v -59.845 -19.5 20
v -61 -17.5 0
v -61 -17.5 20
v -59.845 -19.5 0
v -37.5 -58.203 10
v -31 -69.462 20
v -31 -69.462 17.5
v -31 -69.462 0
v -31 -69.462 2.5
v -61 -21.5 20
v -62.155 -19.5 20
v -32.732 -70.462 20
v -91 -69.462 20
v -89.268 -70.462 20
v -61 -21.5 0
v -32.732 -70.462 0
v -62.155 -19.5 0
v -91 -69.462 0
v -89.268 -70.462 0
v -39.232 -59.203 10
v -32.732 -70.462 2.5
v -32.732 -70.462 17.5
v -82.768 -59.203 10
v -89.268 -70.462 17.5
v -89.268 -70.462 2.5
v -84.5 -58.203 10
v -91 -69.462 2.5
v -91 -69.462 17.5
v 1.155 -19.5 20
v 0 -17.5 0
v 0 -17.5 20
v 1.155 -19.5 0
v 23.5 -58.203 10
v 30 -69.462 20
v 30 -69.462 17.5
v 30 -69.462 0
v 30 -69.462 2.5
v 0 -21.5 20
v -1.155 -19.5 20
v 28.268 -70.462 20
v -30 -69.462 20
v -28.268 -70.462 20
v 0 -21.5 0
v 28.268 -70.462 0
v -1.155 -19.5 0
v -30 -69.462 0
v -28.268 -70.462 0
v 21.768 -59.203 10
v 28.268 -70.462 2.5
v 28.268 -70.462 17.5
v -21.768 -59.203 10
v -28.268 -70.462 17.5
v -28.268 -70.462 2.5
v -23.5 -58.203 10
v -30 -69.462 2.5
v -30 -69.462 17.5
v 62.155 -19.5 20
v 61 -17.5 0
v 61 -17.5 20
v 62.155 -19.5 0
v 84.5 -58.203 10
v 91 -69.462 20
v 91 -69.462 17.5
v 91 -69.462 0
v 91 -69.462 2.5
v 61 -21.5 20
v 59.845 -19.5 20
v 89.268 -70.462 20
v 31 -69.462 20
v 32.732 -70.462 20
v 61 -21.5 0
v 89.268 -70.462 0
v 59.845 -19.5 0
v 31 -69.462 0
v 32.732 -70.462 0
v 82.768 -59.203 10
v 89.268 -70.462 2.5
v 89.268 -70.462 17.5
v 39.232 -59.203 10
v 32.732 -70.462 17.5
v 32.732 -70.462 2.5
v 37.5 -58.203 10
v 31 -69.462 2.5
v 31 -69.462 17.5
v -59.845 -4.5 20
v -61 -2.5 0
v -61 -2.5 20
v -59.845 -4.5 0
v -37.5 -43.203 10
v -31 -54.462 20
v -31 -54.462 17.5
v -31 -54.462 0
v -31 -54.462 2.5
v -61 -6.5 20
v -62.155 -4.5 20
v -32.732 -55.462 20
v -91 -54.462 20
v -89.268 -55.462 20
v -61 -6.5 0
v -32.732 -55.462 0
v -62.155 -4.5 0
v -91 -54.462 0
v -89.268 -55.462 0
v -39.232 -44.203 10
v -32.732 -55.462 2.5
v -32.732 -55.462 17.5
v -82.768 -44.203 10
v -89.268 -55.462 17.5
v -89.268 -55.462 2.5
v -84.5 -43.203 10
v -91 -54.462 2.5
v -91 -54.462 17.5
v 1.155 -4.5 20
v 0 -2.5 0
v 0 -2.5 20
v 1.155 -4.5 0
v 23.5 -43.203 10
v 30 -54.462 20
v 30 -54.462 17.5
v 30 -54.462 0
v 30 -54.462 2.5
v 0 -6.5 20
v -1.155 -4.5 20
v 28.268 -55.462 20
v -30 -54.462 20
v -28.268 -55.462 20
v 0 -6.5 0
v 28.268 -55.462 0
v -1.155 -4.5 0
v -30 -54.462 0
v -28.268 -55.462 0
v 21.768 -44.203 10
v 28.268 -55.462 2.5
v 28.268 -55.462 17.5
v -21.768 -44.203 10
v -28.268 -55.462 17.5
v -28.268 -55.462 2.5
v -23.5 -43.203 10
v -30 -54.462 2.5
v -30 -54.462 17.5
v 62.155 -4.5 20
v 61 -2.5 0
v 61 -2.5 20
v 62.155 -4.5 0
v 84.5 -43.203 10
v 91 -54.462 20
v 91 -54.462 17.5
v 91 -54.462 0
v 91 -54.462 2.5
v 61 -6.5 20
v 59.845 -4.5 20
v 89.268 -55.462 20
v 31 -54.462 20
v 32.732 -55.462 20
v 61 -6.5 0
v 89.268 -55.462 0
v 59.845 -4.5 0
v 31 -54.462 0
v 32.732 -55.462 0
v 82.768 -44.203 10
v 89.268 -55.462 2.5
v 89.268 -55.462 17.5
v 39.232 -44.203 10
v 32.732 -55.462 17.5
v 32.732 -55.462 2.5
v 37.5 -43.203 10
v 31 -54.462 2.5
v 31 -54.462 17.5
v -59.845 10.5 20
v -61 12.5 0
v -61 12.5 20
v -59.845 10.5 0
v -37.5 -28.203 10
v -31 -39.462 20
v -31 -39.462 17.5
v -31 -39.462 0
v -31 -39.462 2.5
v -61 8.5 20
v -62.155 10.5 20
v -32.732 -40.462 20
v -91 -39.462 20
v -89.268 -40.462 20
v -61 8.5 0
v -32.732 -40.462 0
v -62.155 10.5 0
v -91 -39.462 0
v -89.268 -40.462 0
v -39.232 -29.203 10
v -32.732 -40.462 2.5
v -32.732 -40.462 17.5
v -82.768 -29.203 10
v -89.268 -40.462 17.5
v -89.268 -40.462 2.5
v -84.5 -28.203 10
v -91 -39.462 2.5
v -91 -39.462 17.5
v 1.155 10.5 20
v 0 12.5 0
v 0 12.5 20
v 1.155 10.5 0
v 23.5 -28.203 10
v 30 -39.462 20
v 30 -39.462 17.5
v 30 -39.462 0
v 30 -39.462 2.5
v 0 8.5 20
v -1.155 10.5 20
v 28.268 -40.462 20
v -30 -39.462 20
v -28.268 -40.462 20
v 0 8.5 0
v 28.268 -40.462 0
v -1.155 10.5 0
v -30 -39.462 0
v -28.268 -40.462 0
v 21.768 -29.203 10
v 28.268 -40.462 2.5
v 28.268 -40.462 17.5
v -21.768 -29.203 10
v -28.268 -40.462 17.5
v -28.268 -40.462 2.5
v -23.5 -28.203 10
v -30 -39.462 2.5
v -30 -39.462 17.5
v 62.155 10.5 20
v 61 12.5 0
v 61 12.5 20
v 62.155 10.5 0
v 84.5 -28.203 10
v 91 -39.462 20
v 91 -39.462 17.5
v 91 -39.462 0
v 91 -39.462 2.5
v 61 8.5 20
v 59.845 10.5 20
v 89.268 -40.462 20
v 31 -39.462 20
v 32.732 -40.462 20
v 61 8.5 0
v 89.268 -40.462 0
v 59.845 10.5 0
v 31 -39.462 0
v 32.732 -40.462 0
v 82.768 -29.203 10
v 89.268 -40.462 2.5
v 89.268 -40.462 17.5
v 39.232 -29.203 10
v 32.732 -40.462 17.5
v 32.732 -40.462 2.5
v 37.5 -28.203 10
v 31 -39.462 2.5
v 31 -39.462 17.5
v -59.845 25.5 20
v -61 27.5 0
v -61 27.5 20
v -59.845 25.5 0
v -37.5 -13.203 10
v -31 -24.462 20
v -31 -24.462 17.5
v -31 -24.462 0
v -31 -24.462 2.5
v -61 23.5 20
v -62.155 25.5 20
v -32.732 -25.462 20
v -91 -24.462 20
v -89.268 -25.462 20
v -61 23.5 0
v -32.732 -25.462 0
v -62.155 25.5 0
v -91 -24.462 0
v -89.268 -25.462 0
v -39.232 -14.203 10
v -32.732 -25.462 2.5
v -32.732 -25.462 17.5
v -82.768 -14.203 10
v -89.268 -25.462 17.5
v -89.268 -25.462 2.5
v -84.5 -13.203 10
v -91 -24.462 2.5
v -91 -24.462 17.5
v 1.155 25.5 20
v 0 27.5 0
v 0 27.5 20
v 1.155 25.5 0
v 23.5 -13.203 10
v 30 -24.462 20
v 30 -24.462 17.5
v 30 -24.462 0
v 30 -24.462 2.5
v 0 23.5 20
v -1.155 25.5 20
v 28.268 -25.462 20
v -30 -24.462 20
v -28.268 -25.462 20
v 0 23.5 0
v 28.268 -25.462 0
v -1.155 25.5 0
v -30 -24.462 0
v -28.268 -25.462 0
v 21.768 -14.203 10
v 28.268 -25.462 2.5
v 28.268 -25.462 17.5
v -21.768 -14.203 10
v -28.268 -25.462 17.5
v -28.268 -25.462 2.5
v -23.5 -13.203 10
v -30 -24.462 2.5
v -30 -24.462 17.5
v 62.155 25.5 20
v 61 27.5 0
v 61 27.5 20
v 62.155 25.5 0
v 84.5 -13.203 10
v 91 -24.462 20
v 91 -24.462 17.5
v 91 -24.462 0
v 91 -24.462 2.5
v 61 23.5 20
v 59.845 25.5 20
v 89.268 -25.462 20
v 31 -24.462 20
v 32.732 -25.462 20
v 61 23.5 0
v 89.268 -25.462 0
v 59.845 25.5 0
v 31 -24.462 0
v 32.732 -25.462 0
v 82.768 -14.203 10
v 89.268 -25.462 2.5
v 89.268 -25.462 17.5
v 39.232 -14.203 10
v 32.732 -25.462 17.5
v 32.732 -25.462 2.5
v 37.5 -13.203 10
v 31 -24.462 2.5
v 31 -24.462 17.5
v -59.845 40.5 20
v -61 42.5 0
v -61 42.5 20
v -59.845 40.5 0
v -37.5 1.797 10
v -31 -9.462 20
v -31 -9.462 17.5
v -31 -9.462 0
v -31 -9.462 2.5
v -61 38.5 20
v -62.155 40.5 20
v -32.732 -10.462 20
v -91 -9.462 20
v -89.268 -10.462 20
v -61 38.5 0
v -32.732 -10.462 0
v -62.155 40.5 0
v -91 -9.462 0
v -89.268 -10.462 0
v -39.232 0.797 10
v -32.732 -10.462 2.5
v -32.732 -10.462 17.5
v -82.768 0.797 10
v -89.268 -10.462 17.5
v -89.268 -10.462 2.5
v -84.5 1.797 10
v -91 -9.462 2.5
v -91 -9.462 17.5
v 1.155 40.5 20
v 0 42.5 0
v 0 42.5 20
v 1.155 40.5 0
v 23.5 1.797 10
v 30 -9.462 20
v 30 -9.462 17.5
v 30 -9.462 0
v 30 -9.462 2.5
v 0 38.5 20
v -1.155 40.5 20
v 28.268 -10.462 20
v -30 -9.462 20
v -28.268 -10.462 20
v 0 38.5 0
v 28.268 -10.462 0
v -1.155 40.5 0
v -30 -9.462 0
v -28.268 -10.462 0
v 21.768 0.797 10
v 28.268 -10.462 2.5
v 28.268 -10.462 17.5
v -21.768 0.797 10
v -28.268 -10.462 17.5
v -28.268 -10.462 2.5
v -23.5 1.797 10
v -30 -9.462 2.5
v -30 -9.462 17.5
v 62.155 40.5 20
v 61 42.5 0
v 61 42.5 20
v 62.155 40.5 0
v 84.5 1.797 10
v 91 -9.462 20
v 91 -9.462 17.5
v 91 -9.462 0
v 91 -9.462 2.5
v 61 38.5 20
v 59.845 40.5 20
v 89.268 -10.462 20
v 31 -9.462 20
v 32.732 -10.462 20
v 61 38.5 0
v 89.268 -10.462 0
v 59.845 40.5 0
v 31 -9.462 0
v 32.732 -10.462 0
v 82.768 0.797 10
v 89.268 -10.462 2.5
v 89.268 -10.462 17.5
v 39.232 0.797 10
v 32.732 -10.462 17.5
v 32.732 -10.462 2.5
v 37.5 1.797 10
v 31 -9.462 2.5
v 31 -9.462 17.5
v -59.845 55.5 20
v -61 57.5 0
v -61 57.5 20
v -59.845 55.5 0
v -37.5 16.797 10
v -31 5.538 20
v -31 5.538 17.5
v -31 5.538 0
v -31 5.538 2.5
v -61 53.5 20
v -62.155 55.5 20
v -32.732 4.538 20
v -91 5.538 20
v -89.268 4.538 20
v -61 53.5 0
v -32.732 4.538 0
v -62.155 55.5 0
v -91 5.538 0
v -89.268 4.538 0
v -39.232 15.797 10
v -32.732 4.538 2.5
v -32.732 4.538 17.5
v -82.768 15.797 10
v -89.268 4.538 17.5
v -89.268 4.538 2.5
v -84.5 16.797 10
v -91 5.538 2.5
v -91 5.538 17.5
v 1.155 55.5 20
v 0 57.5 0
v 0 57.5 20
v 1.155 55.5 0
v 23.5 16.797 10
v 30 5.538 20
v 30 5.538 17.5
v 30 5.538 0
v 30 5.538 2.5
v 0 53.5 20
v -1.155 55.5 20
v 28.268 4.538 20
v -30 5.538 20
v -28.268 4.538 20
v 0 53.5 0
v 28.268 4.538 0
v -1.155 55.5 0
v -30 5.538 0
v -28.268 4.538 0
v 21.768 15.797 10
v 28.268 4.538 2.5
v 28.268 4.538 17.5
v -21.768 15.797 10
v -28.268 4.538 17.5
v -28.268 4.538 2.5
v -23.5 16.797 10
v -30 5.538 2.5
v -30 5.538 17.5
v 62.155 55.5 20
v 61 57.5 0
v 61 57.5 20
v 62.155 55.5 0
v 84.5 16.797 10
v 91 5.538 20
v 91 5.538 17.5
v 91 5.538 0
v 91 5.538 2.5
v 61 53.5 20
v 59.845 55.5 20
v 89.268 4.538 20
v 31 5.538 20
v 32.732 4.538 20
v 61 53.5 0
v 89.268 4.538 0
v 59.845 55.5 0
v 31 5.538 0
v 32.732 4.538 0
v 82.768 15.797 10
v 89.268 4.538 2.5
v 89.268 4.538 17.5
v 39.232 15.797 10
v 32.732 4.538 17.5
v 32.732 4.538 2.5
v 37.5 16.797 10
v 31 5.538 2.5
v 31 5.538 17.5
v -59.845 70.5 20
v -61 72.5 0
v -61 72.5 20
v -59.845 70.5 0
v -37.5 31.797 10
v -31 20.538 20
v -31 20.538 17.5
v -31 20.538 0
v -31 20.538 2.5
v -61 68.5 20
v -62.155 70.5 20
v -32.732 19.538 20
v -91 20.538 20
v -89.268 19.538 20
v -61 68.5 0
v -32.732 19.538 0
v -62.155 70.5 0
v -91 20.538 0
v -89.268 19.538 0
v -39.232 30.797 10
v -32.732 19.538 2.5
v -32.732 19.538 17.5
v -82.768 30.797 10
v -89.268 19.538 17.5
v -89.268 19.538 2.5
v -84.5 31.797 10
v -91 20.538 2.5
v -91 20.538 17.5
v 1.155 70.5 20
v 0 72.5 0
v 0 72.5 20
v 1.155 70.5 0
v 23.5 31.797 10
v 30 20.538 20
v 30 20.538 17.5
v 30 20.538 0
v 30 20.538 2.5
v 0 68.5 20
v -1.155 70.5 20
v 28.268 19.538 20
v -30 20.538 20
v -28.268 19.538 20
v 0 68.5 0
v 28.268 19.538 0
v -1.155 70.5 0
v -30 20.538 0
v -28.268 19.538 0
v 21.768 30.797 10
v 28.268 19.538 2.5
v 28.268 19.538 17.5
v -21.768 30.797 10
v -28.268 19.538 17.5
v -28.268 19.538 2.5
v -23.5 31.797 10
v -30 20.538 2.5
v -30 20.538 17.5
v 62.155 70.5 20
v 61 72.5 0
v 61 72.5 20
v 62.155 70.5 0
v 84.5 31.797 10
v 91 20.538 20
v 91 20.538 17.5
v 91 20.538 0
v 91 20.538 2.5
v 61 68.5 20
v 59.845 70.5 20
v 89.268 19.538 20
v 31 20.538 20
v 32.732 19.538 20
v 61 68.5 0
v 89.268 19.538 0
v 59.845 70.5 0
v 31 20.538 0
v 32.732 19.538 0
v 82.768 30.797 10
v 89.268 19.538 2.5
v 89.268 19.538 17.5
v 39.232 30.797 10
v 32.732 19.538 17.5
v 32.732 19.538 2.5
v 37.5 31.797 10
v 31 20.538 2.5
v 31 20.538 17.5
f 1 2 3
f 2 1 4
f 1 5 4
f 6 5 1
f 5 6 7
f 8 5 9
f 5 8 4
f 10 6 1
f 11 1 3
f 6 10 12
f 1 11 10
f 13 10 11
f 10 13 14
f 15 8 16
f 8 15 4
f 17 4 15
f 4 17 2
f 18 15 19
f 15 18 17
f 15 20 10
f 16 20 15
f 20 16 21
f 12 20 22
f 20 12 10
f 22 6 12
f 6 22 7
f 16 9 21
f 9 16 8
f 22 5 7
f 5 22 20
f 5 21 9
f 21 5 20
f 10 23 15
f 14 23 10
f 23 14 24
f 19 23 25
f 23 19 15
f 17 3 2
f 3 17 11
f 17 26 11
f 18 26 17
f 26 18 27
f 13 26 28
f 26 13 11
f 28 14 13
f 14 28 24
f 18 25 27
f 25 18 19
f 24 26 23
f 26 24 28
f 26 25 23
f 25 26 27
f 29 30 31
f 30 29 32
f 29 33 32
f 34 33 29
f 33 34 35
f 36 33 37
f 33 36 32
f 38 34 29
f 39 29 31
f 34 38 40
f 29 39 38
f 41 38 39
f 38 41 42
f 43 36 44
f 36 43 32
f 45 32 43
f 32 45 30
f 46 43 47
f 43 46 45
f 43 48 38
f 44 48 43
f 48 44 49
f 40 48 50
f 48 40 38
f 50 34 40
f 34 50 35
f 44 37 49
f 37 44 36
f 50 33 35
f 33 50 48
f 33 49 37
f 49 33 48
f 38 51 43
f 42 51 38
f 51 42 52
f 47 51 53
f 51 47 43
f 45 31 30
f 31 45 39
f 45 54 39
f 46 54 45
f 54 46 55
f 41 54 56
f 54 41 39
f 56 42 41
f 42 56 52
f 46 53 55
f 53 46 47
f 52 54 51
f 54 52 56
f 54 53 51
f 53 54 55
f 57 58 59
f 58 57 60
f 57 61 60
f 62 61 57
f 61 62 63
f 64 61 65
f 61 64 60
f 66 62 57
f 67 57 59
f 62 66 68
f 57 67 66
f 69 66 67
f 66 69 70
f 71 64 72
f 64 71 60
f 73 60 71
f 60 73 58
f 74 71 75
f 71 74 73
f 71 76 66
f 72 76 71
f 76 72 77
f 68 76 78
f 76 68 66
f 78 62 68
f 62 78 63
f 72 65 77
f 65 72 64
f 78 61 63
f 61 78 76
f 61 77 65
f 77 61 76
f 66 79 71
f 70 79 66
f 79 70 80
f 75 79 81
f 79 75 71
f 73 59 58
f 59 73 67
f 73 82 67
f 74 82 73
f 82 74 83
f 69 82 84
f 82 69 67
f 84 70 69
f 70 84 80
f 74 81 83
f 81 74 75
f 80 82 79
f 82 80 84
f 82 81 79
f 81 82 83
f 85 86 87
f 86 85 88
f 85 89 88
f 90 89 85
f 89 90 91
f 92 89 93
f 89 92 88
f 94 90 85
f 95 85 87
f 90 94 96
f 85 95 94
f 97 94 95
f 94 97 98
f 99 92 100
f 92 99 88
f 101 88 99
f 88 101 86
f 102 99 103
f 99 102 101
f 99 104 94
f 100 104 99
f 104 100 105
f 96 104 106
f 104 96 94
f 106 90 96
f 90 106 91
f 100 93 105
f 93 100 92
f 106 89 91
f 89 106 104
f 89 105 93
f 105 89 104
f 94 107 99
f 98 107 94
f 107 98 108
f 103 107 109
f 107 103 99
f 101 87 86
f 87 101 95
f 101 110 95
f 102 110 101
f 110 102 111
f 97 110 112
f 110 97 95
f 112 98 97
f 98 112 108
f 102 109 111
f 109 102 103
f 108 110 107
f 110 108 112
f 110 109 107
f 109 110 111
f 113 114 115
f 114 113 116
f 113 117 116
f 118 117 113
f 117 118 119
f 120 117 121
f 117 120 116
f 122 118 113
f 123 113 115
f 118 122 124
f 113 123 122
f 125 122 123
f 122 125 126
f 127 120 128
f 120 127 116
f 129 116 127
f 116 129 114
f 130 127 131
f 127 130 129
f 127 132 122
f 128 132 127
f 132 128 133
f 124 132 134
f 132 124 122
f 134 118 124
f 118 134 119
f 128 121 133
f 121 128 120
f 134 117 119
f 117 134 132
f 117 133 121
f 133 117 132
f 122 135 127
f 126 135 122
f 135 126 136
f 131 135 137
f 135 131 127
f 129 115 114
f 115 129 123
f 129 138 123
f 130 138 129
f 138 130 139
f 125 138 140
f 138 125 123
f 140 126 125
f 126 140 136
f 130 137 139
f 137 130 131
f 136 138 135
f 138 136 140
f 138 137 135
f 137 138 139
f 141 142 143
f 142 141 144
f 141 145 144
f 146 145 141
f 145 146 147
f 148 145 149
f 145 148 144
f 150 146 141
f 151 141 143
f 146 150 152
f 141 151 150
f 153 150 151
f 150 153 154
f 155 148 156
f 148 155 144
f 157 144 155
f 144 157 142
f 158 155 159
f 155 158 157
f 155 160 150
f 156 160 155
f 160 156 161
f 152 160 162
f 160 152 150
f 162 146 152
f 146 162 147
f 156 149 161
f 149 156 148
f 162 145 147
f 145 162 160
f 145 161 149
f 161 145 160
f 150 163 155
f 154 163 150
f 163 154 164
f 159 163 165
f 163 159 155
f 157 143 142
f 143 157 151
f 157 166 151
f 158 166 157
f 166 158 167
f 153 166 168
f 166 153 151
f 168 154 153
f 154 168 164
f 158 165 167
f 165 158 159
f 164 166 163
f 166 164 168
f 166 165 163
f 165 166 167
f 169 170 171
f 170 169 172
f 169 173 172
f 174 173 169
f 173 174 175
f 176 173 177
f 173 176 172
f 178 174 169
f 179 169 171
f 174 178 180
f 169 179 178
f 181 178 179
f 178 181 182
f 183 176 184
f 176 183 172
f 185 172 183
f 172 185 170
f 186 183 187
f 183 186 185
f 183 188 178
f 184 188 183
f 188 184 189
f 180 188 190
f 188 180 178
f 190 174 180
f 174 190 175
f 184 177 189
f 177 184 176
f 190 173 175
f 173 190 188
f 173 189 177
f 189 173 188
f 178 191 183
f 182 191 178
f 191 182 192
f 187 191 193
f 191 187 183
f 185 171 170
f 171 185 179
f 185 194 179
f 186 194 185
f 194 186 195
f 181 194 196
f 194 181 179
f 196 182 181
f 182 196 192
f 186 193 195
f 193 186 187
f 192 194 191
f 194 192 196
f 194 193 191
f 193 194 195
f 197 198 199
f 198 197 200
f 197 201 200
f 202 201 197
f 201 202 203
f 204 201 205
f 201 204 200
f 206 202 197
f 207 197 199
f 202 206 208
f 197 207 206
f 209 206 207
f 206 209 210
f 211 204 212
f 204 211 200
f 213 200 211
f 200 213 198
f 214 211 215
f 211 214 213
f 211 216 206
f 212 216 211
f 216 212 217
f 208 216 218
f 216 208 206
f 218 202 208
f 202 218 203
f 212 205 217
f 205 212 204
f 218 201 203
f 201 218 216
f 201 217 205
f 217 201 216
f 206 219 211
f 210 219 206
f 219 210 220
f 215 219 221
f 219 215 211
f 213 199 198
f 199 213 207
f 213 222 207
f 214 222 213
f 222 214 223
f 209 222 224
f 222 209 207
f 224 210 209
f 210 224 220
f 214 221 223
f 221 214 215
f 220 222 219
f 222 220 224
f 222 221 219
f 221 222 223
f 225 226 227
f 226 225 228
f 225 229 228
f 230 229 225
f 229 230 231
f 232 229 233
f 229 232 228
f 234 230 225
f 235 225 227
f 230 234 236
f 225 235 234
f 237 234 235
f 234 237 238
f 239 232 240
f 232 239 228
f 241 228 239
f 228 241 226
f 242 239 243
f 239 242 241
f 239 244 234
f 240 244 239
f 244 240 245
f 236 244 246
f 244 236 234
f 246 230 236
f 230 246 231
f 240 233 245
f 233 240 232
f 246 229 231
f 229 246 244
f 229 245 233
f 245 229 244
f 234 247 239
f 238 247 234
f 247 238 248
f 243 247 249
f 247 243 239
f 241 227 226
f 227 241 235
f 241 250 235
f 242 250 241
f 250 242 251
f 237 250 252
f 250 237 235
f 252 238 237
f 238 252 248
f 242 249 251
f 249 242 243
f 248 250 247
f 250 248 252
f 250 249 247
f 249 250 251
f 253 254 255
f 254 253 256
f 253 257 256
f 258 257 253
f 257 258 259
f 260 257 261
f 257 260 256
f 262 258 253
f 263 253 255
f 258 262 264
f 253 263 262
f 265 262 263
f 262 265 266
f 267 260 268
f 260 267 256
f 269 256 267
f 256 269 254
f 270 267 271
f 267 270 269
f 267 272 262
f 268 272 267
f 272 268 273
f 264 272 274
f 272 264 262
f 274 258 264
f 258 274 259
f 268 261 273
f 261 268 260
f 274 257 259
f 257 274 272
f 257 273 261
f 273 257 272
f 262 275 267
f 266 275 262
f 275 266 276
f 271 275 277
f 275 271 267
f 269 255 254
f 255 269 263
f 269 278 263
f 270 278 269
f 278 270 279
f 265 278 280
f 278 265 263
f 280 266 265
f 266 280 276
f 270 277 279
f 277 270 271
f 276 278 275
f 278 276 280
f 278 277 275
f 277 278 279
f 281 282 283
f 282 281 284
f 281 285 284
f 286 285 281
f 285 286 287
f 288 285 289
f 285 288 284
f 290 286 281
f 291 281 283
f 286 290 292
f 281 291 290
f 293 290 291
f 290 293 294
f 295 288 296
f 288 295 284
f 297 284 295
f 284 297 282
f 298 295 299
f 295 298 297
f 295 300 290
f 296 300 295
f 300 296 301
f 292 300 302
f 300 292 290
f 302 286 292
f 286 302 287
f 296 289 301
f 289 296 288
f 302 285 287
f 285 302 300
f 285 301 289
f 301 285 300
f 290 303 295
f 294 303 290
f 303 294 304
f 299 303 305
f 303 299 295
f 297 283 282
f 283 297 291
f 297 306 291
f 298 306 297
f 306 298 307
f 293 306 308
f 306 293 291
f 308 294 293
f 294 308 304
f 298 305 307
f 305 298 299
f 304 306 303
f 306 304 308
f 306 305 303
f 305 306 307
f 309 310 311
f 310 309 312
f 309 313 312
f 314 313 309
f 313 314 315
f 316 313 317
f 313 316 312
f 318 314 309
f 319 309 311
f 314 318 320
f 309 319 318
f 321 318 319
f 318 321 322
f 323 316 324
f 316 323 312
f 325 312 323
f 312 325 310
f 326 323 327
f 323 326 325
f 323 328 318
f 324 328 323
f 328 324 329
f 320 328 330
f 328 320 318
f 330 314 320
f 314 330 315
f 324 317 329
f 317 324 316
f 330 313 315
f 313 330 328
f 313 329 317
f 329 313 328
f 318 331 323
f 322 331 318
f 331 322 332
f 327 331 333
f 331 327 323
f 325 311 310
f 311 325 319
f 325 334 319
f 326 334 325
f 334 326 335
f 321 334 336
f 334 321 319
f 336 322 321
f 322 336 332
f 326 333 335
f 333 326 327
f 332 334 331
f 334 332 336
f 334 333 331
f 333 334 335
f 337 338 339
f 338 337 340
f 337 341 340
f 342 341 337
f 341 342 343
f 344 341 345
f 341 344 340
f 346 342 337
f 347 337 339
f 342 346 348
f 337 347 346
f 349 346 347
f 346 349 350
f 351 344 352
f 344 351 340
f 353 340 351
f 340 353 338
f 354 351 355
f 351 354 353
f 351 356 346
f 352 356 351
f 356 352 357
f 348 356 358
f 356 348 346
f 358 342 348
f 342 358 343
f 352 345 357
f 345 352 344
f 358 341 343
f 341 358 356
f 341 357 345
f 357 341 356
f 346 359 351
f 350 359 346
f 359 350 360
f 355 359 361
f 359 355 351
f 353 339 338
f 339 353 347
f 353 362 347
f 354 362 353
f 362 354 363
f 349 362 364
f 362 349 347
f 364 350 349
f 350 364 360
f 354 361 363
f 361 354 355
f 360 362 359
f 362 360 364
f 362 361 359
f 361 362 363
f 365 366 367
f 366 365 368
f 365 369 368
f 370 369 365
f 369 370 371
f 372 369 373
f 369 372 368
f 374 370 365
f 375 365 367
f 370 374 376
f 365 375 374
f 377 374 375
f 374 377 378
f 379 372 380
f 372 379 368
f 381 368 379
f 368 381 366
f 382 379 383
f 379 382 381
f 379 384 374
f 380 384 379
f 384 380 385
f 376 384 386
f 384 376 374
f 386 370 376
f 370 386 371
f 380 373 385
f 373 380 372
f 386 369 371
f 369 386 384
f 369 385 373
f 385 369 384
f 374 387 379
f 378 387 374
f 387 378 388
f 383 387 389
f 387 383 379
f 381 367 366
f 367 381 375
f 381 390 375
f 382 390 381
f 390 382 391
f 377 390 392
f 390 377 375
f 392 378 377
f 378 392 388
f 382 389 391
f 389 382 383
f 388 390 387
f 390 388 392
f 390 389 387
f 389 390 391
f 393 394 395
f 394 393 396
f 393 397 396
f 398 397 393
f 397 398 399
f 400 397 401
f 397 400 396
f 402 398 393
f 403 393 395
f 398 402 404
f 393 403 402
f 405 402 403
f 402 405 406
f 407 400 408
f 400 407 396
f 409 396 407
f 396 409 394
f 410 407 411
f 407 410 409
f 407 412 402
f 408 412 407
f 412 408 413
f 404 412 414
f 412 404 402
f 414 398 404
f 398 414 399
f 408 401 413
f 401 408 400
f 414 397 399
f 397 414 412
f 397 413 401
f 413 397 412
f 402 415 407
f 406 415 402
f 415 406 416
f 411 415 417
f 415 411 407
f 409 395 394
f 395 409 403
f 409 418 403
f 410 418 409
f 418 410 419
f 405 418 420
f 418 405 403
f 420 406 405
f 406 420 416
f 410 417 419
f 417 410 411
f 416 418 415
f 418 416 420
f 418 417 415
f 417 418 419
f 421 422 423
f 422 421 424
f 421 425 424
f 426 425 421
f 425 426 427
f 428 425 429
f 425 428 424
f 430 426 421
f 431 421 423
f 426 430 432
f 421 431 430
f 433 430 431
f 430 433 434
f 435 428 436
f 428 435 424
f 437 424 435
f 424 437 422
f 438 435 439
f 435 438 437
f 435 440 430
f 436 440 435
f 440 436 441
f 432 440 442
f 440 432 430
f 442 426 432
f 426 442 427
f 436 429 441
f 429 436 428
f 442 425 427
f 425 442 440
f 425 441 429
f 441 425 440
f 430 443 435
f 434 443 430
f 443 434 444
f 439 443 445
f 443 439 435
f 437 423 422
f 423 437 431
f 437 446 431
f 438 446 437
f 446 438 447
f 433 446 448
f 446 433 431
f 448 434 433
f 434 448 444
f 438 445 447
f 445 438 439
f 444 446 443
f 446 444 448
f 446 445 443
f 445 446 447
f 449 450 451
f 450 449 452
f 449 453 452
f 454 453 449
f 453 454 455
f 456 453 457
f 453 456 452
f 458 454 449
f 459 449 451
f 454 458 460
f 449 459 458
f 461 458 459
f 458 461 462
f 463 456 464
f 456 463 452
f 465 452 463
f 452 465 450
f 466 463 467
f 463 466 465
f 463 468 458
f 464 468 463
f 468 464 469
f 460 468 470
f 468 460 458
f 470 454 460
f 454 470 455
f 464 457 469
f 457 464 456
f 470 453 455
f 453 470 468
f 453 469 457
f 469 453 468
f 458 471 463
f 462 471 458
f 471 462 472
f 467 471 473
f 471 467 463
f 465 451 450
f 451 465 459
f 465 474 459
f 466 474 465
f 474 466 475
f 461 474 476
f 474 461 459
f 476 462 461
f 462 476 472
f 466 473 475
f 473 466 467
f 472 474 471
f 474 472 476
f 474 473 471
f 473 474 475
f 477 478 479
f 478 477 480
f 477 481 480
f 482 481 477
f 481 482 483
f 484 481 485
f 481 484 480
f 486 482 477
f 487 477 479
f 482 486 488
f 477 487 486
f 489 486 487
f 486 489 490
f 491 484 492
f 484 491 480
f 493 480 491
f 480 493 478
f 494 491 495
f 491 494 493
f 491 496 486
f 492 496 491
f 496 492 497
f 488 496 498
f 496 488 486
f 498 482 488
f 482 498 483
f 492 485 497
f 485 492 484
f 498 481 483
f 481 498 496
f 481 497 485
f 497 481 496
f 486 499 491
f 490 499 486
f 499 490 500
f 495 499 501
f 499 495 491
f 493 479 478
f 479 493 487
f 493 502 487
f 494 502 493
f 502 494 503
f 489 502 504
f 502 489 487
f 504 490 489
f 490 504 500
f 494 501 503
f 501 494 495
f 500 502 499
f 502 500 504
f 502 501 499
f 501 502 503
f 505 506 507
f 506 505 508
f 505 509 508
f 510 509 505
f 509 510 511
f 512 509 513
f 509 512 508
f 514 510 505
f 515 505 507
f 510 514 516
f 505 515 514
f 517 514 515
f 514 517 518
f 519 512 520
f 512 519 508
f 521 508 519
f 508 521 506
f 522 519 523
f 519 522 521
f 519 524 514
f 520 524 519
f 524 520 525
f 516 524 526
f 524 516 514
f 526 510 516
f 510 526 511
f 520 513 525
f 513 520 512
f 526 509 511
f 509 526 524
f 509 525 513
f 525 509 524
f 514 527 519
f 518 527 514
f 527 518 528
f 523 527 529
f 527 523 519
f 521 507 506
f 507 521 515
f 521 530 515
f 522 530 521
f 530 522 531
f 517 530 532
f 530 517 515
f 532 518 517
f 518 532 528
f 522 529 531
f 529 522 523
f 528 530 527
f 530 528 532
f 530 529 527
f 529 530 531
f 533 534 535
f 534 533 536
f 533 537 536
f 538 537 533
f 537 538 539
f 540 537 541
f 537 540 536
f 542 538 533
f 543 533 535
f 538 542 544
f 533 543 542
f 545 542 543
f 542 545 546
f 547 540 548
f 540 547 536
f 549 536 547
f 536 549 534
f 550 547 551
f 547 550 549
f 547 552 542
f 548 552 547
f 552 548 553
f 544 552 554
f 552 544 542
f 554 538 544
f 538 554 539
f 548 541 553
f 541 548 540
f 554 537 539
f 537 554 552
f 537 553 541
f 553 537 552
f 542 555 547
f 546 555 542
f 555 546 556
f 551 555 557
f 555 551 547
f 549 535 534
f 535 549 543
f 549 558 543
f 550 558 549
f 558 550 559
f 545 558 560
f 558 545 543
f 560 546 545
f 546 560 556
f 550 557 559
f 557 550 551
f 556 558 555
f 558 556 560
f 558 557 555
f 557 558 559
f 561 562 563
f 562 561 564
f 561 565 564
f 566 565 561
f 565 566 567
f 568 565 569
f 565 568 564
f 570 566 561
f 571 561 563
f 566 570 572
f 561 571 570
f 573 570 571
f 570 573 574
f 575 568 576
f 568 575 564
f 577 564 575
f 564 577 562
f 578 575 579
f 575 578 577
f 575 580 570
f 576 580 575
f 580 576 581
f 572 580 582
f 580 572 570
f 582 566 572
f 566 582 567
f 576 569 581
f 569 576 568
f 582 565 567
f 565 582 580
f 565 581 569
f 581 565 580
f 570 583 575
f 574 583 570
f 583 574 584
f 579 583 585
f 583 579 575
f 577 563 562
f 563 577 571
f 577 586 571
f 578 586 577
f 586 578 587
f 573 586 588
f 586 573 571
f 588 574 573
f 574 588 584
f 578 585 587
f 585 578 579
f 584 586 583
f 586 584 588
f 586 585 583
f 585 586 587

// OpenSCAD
/* [Custom] */ 

SCALE = 1.0; // [0.1:0.1:1.0]
NUMBER = 21; // [1,7,21,30,57]
    
if (NUMBER == 1)
{
    finishedWhole();
}
else if (NUMBER == 7)
{
  for(a = [-45 : 15 : 45])
    translate([0,a,0]) finishedWhole();
}
else if (NUMBER == 21)
{    
 for(a = [-45 : 15 : 45])
  for(b = [-61: 61: 61])
   translate([b,a,0]) finishedWhole();    
}
else if (NUMBER == 30)
{    
 for(a = [-45 : 10 : 45])
  for(b = [-61: 61: 61])
   translate([b,a,0]) finishedWhole();    
}
else 
{    
 for(a = [-45 : 5 : 45])
  for(b = [-61: 61: 61])
   translate([b,a,0]) finishedWhole();    
}

module board()
{ 
    cube([4,120,40], center=true);
}

module notch()
{
polyhedron(
  points=[ [-2,-60,15], [-2,-34,0], [-2,-60,-15], 
           [2,-60,15], [2,-34,0], [2,-60,-15], ],                                 
  faces=[ [0,1,2], [0,2,5,3], [0,3,4,1], [1,4,5,2], [3,5,4] ]                         
 );    
}

module hemiPiece()
{
    difference()
    {
        board();
        notch();
    }
}

module roughWhole()
{
    rotate([0,0,30]) translate([-2,-60,0]) hemiPiece();
    rotate([0,0,-30]) translate([2,-60,0]) hemiPiece();
}

module finishedWhole()
{
 scale([SCALE*0.5,SCALE*0.5,SCALE*0.5]) 
  translate([0,55,20])
   union()
   {  
    difference()
    {
        roughWhole();
        cleaver();
    }
    intersection()
    {
     rotate([0,0,30]) translate([-2,-60,0]) hemiPiece();
     rotate([0,0,-30]) translate([2,-60,0]) hemiPiece();        
    }
   }
}

module cleaver()
{
    cube([15,8,45], center=true);
}
